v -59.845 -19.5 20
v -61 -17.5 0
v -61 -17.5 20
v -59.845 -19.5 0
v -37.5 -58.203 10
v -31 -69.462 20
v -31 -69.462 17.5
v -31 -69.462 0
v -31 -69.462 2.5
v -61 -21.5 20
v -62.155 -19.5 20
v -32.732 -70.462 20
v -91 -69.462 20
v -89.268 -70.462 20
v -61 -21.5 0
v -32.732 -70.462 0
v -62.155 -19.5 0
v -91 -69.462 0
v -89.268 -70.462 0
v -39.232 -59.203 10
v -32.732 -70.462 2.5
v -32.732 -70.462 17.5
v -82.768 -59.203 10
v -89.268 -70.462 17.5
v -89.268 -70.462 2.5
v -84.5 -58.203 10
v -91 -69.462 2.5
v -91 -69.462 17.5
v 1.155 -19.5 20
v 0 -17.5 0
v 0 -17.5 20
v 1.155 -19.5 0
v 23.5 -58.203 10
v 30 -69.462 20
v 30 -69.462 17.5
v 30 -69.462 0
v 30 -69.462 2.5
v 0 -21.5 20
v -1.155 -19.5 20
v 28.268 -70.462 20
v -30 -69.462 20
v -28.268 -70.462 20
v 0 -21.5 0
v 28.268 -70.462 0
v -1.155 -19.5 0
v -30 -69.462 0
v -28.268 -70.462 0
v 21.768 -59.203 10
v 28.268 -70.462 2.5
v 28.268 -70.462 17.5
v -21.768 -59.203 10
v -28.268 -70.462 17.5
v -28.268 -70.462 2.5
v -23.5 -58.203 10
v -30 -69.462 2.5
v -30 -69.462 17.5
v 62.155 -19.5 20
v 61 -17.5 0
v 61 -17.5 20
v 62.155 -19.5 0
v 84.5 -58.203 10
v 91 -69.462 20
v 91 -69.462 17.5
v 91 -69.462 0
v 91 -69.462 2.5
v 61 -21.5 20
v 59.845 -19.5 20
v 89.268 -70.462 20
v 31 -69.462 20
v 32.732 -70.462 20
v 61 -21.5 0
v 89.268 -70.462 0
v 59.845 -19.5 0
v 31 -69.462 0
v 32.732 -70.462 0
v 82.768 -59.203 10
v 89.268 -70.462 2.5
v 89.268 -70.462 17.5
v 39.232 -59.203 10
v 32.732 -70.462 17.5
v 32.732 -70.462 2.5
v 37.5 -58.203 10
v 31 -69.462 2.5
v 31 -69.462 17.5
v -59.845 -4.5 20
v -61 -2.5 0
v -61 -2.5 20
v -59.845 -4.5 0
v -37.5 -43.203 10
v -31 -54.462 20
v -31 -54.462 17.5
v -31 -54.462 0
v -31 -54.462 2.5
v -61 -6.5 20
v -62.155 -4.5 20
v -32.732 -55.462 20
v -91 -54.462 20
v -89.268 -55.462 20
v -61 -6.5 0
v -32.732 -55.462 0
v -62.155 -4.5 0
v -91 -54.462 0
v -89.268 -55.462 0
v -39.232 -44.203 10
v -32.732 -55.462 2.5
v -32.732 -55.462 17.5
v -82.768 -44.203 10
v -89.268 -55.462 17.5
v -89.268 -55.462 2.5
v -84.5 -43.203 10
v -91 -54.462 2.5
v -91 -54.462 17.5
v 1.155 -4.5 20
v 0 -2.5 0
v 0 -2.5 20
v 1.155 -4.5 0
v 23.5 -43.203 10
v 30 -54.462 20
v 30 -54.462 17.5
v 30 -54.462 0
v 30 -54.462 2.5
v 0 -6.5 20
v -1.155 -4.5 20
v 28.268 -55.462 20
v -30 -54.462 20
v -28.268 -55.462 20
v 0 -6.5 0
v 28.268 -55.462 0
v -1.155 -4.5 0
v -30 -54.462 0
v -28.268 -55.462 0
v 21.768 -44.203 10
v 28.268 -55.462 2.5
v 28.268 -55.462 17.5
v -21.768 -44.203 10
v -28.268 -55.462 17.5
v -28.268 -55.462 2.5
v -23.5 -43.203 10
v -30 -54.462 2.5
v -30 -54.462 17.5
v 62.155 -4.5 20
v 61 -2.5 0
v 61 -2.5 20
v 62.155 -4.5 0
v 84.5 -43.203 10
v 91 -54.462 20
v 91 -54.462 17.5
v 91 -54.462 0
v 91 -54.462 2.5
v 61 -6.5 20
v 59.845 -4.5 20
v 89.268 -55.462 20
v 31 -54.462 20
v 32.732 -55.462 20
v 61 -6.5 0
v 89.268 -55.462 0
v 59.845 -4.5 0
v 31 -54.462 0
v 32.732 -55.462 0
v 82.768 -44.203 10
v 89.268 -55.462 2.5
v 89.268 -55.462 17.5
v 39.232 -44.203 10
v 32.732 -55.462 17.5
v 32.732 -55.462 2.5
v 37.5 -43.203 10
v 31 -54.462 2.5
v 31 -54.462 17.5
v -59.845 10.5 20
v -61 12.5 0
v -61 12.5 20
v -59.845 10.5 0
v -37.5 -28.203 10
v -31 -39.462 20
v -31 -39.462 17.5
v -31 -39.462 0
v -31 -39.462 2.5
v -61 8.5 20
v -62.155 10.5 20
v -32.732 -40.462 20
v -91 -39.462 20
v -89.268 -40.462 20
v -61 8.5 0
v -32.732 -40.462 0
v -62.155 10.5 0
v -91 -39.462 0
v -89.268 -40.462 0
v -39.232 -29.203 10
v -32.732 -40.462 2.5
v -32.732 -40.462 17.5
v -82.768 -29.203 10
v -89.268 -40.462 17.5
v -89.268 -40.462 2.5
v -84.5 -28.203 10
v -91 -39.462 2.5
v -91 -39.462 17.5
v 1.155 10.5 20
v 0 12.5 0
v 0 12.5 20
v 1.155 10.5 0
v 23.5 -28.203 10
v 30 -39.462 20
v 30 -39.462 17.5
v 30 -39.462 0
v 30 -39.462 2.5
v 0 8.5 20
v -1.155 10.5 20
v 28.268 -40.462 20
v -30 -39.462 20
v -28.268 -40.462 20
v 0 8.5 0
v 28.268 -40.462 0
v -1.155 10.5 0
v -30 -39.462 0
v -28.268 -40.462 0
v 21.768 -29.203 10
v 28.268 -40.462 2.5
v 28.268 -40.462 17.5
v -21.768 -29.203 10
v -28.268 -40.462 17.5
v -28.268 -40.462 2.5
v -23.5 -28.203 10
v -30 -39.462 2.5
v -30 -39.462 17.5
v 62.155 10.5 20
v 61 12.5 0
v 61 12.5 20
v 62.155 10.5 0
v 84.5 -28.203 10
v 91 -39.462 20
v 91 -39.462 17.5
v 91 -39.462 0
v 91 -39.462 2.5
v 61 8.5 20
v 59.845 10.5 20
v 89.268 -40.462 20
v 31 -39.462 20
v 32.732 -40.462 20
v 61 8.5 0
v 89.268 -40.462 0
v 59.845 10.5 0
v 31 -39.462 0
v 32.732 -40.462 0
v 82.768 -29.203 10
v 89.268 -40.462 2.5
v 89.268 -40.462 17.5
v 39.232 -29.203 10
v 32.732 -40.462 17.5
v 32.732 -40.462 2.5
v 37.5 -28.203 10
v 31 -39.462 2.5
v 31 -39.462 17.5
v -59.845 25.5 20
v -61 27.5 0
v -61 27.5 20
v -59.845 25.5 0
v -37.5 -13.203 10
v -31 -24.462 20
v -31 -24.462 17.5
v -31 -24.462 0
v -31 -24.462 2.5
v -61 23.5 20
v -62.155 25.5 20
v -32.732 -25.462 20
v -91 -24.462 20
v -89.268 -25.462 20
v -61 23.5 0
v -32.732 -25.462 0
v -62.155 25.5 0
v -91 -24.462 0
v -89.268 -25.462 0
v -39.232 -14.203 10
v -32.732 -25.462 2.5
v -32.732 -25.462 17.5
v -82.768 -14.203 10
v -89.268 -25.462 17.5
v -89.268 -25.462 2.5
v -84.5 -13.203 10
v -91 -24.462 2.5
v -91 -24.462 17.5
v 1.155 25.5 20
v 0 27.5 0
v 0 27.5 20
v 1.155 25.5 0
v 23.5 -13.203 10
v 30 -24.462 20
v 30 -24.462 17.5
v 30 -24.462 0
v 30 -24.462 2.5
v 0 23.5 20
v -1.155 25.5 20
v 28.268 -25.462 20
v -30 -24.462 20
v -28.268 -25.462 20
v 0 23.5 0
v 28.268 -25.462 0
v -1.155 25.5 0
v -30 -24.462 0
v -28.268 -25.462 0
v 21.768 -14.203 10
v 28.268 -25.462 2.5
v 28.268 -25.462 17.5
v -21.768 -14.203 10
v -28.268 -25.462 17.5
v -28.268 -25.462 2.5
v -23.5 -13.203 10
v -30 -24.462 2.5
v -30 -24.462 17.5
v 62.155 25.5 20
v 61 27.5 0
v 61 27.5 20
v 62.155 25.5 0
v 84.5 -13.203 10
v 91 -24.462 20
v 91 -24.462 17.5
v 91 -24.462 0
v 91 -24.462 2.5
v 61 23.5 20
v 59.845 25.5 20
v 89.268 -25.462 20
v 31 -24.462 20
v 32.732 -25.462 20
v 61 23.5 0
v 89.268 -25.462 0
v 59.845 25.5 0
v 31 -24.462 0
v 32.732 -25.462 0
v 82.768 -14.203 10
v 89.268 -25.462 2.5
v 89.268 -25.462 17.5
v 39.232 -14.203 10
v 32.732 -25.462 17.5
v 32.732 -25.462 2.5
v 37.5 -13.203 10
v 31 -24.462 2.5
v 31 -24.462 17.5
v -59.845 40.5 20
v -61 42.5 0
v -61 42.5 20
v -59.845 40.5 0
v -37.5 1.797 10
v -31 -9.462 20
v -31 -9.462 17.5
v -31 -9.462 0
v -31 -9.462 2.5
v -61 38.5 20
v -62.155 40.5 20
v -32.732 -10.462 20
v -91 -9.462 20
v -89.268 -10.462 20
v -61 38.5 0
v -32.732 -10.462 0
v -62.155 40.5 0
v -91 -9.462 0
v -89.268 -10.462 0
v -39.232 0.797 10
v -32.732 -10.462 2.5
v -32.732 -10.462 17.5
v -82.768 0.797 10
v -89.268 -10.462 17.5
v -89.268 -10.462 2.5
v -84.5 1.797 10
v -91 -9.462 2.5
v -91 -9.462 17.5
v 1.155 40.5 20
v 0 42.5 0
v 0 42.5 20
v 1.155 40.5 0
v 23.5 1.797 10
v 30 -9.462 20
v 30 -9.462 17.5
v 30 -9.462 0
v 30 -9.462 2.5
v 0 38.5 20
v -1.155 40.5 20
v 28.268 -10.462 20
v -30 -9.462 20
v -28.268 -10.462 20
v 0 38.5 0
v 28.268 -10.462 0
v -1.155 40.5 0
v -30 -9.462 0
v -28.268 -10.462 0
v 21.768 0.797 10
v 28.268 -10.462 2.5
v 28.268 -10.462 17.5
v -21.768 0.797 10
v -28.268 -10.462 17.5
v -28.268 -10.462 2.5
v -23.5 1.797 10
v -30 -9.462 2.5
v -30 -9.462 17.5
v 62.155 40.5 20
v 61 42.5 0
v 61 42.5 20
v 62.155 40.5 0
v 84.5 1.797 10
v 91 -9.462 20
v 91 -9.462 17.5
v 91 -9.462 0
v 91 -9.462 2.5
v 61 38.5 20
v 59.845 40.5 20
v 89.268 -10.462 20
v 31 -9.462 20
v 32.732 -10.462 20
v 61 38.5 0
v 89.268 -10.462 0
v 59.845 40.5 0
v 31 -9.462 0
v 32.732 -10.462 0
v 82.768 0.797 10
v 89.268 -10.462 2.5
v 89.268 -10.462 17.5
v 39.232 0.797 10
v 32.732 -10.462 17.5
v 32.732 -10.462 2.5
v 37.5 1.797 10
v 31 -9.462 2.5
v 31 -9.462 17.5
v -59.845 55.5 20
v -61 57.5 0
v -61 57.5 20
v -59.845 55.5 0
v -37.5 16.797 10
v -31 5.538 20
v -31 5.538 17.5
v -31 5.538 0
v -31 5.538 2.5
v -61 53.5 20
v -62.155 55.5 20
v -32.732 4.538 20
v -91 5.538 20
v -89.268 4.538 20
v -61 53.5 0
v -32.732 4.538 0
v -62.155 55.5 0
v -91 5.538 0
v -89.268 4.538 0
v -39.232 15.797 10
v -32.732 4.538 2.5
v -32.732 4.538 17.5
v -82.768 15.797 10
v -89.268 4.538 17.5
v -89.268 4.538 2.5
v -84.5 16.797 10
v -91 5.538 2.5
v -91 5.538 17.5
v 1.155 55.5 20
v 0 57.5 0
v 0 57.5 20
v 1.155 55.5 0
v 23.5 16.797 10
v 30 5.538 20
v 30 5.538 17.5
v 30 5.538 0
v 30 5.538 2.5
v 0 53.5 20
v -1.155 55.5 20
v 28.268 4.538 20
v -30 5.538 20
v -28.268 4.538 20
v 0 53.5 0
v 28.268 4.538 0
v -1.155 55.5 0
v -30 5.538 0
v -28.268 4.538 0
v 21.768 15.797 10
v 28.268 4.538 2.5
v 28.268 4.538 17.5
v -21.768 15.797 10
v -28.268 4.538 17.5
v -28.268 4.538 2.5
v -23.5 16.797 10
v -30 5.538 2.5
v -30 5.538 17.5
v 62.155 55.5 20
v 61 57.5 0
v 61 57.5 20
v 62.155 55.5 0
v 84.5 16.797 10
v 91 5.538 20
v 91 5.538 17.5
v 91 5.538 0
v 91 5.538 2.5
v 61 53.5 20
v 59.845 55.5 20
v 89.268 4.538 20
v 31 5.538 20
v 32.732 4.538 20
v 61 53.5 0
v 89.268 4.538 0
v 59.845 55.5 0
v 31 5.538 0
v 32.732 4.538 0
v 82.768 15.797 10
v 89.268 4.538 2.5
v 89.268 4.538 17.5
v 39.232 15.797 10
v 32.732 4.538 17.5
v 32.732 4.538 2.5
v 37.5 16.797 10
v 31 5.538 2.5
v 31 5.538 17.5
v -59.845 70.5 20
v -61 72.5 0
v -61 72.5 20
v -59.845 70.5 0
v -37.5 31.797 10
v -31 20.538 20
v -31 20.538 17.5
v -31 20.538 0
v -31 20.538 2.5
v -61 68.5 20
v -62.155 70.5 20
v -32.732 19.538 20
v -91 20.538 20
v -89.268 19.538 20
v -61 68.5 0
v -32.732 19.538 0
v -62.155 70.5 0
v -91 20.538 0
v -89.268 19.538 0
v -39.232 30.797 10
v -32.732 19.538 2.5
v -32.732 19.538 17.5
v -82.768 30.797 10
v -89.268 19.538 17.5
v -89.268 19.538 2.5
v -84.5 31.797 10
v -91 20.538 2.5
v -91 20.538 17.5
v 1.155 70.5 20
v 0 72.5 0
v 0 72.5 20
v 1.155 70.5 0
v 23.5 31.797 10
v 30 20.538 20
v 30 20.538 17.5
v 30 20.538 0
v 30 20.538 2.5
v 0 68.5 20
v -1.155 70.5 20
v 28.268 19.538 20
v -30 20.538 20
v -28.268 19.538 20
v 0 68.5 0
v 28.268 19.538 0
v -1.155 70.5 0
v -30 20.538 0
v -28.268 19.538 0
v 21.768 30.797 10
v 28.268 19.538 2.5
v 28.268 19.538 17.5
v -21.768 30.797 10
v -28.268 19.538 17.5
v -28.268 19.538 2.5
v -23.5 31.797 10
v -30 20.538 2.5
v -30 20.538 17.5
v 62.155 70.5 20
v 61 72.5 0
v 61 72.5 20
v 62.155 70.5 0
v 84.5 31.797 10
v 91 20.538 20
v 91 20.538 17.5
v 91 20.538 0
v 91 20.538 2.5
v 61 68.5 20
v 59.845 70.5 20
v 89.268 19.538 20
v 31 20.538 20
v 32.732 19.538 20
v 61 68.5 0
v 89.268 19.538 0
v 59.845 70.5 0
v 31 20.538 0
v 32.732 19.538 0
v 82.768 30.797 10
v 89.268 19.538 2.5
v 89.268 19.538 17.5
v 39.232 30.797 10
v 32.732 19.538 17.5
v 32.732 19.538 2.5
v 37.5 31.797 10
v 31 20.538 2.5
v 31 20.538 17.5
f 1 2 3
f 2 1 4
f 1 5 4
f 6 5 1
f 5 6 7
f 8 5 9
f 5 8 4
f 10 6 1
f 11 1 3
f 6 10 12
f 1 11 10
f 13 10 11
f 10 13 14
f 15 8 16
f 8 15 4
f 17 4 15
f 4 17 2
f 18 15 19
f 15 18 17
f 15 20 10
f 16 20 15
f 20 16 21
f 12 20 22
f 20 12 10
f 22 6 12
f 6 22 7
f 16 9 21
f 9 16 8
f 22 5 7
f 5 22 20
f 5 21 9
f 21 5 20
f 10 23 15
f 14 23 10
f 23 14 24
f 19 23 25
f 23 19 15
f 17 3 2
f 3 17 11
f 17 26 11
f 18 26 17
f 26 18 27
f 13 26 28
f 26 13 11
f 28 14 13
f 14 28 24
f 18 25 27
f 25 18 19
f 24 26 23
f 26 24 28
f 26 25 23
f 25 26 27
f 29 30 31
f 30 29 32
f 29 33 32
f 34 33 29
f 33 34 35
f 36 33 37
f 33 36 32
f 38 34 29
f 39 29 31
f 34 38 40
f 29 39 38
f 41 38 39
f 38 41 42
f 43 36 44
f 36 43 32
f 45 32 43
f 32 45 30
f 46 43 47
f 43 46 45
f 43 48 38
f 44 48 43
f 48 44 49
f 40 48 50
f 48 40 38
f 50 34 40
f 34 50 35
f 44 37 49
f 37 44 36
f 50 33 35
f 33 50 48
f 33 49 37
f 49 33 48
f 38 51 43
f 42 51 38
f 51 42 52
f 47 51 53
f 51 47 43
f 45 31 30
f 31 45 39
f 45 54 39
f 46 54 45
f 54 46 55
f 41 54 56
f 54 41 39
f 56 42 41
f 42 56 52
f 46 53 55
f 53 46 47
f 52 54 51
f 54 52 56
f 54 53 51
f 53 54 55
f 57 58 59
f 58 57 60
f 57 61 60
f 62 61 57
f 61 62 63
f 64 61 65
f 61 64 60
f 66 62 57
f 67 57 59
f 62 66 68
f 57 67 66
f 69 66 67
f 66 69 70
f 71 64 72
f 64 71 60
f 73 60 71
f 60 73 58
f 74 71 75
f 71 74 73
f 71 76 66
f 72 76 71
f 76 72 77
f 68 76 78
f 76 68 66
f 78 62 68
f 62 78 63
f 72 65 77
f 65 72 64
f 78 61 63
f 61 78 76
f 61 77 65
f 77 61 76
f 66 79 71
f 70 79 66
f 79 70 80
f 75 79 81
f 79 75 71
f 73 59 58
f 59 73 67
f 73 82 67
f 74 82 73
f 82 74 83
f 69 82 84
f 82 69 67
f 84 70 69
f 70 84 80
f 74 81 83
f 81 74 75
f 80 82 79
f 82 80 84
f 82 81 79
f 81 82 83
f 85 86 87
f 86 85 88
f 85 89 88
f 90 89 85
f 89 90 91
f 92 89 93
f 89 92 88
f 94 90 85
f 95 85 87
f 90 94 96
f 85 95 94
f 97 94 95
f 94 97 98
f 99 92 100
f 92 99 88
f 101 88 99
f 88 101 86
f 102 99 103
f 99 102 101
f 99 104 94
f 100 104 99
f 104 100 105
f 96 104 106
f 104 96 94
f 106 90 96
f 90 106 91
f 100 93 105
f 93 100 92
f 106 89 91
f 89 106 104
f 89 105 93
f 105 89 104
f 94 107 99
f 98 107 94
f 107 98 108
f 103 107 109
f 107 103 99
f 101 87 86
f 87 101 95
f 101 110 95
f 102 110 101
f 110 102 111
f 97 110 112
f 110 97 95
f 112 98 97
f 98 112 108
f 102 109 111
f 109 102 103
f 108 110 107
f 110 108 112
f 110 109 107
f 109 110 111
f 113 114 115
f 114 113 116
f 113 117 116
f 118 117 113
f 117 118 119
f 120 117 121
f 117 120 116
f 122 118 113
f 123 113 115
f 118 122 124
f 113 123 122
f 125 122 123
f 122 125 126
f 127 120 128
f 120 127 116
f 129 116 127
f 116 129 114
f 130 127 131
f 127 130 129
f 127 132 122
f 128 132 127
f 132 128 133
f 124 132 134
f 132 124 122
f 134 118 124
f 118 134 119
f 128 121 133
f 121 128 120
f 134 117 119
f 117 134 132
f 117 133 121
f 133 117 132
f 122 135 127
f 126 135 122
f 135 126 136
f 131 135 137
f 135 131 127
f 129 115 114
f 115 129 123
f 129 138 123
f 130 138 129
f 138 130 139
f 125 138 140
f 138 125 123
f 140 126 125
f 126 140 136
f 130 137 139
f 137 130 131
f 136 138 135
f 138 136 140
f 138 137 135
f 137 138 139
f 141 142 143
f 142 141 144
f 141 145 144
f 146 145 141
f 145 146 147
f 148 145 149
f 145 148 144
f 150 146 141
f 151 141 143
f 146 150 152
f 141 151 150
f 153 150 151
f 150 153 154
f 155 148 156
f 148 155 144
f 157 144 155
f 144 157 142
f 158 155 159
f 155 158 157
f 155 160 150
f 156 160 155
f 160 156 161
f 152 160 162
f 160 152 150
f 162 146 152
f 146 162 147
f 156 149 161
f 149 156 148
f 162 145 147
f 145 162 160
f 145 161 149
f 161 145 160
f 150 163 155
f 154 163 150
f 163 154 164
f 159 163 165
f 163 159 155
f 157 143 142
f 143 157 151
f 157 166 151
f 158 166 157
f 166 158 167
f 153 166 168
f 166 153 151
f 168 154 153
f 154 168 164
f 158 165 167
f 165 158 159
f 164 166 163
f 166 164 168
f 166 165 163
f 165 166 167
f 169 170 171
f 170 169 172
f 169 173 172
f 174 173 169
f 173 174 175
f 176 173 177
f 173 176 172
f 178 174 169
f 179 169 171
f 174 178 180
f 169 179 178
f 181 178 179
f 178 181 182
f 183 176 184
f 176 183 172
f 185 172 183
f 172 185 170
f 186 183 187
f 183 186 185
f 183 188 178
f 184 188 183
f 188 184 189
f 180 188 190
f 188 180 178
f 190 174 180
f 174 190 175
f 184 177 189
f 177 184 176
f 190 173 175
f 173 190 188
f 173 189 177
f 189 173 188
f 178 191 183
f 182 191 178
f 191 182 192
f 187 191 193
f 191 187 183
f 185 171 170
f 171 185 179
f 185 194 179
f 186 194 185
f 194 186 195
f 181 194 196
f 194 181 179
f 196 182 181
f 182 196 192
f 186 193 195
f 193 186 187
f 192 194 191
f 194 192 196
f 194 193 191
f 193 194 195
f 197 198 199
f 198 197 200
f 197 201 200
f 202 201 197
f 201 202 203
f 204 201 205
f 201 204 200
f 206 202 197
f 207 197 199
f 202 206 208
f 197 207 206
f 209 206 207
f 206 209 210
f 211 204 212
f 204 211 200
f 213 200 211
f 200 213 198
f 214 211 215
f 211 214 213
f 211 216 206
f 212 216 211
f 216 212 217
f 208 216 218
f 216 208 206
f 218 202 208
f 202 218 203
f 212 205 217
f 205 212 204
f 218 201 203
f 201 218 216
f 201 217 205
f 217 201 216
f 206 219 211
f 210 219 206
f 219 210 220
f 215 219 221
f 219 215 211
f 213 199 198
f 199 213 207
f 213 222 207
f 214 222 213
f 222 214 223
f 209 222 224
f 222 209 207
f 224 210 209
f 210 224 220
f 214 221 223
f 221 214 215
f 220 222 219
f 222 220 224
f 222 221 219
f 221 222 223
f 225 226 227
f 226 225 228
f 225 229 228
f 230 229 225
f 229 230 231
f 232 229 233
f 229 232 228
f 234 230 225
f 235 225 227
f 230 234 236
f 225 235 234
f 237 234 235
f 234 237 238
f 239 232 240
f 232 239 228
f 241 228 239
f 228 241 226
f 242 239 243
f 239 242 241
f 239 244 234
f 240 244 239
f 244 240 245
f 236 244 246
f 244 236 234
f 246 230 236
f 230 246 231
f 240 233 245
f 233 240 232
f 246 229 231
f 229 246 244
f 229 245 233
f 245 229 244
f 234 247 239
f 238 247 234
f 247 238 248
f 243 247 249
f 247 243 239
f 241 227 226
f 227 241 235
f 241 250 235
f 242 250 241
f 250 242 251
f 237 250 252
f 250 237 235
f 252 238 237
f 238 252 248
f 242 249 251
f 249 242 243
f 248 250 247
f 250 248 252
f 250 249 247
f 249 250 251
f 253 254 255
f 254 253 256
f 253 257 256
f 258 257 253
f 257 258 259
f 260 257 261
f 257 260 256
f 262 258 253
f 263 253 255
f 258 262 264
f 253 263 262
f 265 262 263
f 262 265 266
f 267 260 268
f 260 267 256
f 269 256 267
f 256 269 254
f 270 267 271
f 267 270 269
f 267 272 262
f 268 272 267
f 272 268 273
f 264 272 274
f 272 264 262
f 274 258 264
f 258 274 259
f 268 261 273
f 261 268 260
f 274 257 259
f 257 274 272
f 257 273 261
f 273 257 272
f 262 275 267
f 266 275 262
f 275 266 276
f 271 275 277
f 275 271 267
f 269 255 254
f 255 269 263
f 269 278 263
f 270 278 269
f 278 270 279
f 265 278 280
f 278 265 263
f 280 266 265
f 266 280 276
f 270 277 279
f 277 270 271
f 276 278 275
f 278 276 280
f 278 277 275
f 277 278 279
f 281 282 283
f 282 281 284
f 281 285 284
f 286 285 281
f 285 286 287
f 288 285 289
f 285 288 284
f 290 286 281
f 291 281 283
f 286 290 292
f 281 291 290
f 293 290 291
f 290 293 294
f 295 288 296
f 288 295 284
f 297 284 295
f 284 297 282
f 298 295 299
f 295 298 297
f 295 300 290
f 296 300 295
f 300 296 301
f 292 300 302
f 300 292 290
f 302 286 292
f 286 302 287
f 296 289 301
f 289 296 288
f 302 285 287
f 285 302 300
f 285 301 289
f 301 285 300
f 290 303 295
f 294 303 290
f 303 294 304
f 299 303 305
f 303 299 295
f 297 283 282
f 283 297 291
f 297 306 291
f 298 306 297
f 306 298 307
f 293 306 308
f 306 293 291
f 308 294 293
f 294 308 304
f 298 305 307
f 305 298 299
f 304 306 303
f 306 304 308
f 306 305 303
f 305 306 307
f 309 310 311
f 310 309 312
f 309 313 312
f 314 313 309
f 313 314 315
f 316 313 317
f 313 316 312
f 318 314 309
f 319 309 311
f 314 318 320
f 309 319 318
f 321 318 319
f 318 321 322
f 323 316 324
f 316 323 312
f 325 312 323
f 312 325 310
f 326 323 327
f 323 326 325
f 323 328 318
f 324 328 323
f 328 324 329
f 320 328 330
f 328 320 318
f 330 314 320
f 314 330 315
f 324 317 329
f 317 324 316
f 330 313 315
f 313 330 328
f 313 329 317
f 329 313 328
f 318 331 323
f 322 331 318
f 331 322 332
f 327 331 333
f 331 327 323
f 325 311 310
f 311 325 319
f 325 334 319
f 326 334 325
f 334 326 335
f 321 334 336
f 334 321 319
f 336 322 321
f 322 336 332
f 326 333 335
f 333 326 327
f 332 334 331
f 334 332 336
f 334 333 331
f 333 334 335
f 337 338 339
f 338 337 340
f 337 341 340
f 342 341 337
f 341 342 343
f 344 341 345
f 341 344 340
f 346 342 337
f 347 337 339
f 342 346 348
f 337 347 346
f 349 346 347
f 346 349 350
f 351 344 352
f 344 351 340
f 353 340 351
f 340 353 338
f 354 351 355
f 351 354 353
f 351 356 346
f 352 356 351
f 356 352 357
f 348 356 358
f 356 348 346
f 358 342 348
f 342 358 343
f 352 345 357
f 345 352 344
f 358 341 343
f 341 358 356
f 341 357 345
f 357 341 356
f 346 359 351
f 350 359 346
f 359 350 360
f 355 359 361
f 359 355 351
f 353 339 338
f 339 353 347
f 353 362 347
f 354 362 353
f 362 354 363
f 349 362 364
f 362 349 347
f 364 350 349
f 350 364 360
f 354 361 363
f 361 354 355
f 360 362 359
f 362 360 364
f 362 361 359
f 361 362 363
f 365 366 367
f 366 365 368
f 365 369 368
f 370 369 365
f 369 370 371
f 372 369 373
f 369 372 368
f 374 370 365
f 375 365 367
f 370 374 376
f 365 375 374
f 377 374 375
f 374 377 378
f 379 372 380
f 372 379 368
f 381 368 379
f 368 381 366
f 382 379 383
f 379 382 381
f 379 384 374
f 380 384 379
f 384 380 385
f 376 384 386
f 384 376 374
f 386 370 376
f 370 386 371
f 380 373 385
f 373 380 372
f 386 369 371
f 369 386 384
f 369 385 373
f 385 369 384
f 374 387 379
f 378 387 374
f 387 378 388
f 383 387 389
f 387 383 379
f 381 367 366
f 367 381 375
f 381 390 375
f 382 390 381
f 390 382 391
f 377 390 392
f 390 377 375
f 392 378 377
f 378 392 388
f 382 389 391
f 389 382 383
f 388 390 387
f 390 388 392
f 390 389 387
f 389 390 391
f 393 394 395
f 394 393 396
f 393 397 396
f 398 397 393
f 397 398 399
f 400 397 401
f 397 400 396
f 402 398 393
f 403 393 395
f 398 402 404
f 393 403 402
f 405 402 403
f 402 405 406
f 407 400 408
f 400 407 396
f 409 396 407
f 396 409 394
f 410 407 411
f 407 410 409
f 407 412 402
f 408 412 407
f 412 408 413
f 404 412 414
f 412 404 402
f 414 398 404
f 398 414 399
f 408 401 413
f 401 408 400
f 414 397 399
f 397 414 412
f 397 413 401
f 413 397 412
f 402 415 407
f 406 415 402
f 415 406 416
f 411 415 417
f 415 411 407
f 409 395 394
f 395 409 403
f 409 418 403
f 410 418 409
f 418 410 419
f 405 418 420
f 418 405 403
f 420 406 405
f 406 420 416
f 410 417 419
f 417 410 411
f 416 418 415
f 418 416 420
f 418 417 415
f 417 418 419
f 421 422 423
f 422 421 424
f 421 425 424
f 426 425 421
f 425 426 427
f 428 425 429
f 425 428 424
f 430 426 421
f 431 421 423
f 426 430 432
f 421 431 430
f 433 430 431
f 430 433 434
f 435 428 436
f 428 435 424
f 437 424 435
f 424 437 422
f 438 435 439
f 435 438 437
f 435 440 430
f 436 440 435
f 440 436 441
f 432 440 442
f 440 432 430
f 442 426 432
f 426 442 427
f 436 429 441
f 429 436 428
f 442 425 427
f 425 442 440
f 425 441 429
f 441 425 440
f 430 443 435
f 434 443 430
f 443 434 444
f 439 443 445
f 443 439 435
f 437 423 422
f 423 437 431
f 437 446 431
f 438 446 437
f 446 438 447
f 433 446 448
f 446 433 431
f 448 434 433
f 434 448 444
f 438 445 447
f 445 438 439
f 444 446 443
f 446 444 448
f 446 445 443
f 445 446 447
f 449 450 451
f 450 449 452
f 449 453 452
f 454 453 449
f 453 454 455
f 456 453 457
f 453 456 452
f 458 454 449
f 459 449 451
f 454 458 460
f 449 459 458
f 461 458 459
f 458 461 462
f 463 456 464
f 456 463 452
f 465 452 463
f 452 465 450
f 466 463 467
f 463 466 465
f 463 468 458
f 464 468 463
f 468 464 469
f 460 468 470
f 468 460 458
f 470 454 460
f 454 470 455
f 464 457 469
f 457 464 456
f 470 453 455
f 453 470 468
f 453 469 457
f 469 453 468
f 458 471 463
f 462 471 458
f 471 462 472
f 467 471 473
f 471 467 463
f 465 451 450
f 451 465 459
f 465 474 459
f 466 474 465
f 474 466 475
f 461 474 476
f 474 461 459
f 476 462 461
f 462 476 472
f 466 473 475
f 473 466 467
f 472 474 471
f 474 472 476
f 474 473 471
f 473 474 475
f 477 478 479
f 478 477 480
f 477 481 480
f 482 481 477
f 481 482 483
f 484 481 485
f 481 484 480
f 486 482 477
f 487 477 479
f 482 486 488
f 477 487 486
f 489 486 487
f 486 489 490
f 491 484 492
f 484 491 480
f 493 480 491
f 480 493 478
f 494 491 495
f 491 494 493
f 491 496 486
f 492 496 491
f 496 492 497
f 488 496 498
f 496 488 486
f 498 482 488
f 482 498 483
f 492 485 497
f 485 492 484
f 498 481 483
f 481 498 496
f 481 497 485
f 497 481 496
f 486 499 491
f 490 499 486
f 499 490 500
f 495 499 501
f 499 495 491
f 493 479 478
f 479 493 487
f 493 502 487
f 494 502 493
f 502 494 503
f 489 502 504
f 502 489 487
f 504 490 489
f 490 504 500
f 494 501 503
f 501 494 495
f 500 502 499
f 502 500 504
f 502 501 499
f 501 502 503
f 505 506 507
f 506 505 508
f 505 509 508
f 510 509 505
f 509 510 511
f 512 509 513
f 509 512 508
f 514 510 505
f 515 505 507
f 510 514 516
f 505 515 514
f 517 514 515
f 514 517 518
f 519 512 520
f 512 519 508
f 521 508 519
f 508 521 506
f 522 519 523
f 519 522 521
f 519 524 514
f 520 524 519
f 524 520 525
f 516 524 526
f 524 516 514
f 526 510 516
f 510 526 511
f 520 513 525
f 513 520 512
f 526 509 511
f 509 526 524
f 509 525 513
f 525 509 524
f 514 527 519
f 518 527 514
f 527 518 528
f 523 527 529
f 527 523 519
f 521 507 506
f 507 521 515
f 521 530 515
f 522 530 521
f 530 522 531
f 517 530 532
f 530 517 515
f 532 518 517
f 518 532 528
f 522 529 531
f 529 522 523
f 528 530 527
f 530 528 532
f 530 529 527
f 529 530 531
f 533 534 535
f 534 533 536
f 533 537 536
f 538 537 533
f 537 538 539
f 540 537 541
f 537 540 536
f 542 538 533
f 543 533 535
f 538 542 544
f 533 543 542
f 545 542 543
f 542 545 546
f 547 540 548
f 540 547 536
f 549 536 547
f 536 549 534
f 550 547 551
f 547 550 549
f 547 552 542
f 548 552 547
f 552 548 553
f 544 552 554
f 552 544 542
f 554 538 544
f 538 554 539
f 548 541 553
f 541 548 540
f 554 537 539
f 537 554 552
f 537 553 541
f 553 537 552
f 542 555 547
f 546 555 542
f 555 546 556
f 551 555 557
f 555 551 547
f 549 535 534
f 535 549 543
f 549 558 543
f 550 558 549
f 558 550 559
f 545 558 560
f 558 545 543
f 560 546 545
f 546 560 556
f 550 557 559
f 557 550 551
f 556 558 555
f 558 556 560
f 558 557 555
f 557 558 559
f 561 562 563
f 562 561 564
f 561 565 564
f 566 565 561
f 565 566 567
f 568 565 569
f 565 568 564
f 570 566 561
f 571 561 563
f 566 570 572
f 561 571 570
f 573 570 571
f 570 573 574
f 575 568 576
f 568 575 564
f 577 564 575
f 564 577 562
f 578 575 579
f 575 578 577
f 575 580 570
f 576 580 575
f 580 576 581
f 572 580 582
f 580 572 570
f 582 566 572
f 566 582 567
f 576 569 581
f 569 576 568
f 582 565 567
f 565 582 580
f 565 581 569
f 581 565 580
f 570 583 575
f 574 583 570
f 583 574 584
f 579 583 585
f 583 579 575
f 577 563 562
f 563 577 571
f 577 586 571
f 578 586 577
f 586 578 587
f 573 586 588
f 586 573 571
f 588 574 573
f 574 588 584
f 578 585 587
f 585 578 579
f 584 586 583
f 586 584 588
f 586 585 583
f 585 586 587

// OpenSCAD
/* [Custom] */ 

SCALE = 1.0; // [0.1:0.1:1.0]
NUMBER = 21; // [1,7,21,30,57]
    
if (NUMBER == 1)
{
    finishedWhole();
}
else if (NUMBER == 7)
{
  for(a = [-45 : 15 : 45])
    translate([0,a,0]) finishedWhole();
}
else if (NUMBER == 21)
{    
 for(a = [-45 : 15 : 45])
  for(b = [-61: 61: 61])
   translate([b,a,0]) finishedWhole();    
}
else if (NUMBER == 30)
{    
 for(a = [-45 : 10 : 45])
  for(b = [-61: 61: 61])
   translate([b,a,0]) finishedWhole();    
}
else 
{    
 for(a = [-45 : 5 : 45])
  for(b = [-61: 61: 61])
   translate([b,a,0]) finishedWhole();    
}

module board()
{ 
    cube([4,120,40], center=true);
}

module notch()
{
polyhedron(
  points=[ [-2,-60,15], [-2,-34,0], [-2,-60,-15], 
           [2,-60,15], [2,-34,0], [2,-60,-15], ],                                 
  faces=[ [0,1,2], [0,2,5,3], [0,3,4,1], [1,4,5,2], [3,5,4] ]                         
 );    
}

module hemiPiece()
{
    difference()
    {
        board();
        notch();
    }
}

module roughWhole()
{
    rotate([0,0,30]) translate([-2,-60,0]) hemiPiece();
    rotate([0,0,-30]) translate([2,-60,0]) hemiPiece();
}

module finishedWhole()
{
 scale([SCALE*0.5,SCALE*0.5,SCALE*0.5]) 
  translate([0,55,20])
   union()
   {  
    difference()
    {
        roughWhole();
        cleaver();
    }
    intersection()
    {
     rotate([0,0,30]) translate([-2,-60,0]) hemiPiece();
     rotate([0,0,-30]) translate([2,-60,0]) hemiPiece();        
    }
   }
}

module cleaver()
{
    cube([15,8,45], center=true);
}
